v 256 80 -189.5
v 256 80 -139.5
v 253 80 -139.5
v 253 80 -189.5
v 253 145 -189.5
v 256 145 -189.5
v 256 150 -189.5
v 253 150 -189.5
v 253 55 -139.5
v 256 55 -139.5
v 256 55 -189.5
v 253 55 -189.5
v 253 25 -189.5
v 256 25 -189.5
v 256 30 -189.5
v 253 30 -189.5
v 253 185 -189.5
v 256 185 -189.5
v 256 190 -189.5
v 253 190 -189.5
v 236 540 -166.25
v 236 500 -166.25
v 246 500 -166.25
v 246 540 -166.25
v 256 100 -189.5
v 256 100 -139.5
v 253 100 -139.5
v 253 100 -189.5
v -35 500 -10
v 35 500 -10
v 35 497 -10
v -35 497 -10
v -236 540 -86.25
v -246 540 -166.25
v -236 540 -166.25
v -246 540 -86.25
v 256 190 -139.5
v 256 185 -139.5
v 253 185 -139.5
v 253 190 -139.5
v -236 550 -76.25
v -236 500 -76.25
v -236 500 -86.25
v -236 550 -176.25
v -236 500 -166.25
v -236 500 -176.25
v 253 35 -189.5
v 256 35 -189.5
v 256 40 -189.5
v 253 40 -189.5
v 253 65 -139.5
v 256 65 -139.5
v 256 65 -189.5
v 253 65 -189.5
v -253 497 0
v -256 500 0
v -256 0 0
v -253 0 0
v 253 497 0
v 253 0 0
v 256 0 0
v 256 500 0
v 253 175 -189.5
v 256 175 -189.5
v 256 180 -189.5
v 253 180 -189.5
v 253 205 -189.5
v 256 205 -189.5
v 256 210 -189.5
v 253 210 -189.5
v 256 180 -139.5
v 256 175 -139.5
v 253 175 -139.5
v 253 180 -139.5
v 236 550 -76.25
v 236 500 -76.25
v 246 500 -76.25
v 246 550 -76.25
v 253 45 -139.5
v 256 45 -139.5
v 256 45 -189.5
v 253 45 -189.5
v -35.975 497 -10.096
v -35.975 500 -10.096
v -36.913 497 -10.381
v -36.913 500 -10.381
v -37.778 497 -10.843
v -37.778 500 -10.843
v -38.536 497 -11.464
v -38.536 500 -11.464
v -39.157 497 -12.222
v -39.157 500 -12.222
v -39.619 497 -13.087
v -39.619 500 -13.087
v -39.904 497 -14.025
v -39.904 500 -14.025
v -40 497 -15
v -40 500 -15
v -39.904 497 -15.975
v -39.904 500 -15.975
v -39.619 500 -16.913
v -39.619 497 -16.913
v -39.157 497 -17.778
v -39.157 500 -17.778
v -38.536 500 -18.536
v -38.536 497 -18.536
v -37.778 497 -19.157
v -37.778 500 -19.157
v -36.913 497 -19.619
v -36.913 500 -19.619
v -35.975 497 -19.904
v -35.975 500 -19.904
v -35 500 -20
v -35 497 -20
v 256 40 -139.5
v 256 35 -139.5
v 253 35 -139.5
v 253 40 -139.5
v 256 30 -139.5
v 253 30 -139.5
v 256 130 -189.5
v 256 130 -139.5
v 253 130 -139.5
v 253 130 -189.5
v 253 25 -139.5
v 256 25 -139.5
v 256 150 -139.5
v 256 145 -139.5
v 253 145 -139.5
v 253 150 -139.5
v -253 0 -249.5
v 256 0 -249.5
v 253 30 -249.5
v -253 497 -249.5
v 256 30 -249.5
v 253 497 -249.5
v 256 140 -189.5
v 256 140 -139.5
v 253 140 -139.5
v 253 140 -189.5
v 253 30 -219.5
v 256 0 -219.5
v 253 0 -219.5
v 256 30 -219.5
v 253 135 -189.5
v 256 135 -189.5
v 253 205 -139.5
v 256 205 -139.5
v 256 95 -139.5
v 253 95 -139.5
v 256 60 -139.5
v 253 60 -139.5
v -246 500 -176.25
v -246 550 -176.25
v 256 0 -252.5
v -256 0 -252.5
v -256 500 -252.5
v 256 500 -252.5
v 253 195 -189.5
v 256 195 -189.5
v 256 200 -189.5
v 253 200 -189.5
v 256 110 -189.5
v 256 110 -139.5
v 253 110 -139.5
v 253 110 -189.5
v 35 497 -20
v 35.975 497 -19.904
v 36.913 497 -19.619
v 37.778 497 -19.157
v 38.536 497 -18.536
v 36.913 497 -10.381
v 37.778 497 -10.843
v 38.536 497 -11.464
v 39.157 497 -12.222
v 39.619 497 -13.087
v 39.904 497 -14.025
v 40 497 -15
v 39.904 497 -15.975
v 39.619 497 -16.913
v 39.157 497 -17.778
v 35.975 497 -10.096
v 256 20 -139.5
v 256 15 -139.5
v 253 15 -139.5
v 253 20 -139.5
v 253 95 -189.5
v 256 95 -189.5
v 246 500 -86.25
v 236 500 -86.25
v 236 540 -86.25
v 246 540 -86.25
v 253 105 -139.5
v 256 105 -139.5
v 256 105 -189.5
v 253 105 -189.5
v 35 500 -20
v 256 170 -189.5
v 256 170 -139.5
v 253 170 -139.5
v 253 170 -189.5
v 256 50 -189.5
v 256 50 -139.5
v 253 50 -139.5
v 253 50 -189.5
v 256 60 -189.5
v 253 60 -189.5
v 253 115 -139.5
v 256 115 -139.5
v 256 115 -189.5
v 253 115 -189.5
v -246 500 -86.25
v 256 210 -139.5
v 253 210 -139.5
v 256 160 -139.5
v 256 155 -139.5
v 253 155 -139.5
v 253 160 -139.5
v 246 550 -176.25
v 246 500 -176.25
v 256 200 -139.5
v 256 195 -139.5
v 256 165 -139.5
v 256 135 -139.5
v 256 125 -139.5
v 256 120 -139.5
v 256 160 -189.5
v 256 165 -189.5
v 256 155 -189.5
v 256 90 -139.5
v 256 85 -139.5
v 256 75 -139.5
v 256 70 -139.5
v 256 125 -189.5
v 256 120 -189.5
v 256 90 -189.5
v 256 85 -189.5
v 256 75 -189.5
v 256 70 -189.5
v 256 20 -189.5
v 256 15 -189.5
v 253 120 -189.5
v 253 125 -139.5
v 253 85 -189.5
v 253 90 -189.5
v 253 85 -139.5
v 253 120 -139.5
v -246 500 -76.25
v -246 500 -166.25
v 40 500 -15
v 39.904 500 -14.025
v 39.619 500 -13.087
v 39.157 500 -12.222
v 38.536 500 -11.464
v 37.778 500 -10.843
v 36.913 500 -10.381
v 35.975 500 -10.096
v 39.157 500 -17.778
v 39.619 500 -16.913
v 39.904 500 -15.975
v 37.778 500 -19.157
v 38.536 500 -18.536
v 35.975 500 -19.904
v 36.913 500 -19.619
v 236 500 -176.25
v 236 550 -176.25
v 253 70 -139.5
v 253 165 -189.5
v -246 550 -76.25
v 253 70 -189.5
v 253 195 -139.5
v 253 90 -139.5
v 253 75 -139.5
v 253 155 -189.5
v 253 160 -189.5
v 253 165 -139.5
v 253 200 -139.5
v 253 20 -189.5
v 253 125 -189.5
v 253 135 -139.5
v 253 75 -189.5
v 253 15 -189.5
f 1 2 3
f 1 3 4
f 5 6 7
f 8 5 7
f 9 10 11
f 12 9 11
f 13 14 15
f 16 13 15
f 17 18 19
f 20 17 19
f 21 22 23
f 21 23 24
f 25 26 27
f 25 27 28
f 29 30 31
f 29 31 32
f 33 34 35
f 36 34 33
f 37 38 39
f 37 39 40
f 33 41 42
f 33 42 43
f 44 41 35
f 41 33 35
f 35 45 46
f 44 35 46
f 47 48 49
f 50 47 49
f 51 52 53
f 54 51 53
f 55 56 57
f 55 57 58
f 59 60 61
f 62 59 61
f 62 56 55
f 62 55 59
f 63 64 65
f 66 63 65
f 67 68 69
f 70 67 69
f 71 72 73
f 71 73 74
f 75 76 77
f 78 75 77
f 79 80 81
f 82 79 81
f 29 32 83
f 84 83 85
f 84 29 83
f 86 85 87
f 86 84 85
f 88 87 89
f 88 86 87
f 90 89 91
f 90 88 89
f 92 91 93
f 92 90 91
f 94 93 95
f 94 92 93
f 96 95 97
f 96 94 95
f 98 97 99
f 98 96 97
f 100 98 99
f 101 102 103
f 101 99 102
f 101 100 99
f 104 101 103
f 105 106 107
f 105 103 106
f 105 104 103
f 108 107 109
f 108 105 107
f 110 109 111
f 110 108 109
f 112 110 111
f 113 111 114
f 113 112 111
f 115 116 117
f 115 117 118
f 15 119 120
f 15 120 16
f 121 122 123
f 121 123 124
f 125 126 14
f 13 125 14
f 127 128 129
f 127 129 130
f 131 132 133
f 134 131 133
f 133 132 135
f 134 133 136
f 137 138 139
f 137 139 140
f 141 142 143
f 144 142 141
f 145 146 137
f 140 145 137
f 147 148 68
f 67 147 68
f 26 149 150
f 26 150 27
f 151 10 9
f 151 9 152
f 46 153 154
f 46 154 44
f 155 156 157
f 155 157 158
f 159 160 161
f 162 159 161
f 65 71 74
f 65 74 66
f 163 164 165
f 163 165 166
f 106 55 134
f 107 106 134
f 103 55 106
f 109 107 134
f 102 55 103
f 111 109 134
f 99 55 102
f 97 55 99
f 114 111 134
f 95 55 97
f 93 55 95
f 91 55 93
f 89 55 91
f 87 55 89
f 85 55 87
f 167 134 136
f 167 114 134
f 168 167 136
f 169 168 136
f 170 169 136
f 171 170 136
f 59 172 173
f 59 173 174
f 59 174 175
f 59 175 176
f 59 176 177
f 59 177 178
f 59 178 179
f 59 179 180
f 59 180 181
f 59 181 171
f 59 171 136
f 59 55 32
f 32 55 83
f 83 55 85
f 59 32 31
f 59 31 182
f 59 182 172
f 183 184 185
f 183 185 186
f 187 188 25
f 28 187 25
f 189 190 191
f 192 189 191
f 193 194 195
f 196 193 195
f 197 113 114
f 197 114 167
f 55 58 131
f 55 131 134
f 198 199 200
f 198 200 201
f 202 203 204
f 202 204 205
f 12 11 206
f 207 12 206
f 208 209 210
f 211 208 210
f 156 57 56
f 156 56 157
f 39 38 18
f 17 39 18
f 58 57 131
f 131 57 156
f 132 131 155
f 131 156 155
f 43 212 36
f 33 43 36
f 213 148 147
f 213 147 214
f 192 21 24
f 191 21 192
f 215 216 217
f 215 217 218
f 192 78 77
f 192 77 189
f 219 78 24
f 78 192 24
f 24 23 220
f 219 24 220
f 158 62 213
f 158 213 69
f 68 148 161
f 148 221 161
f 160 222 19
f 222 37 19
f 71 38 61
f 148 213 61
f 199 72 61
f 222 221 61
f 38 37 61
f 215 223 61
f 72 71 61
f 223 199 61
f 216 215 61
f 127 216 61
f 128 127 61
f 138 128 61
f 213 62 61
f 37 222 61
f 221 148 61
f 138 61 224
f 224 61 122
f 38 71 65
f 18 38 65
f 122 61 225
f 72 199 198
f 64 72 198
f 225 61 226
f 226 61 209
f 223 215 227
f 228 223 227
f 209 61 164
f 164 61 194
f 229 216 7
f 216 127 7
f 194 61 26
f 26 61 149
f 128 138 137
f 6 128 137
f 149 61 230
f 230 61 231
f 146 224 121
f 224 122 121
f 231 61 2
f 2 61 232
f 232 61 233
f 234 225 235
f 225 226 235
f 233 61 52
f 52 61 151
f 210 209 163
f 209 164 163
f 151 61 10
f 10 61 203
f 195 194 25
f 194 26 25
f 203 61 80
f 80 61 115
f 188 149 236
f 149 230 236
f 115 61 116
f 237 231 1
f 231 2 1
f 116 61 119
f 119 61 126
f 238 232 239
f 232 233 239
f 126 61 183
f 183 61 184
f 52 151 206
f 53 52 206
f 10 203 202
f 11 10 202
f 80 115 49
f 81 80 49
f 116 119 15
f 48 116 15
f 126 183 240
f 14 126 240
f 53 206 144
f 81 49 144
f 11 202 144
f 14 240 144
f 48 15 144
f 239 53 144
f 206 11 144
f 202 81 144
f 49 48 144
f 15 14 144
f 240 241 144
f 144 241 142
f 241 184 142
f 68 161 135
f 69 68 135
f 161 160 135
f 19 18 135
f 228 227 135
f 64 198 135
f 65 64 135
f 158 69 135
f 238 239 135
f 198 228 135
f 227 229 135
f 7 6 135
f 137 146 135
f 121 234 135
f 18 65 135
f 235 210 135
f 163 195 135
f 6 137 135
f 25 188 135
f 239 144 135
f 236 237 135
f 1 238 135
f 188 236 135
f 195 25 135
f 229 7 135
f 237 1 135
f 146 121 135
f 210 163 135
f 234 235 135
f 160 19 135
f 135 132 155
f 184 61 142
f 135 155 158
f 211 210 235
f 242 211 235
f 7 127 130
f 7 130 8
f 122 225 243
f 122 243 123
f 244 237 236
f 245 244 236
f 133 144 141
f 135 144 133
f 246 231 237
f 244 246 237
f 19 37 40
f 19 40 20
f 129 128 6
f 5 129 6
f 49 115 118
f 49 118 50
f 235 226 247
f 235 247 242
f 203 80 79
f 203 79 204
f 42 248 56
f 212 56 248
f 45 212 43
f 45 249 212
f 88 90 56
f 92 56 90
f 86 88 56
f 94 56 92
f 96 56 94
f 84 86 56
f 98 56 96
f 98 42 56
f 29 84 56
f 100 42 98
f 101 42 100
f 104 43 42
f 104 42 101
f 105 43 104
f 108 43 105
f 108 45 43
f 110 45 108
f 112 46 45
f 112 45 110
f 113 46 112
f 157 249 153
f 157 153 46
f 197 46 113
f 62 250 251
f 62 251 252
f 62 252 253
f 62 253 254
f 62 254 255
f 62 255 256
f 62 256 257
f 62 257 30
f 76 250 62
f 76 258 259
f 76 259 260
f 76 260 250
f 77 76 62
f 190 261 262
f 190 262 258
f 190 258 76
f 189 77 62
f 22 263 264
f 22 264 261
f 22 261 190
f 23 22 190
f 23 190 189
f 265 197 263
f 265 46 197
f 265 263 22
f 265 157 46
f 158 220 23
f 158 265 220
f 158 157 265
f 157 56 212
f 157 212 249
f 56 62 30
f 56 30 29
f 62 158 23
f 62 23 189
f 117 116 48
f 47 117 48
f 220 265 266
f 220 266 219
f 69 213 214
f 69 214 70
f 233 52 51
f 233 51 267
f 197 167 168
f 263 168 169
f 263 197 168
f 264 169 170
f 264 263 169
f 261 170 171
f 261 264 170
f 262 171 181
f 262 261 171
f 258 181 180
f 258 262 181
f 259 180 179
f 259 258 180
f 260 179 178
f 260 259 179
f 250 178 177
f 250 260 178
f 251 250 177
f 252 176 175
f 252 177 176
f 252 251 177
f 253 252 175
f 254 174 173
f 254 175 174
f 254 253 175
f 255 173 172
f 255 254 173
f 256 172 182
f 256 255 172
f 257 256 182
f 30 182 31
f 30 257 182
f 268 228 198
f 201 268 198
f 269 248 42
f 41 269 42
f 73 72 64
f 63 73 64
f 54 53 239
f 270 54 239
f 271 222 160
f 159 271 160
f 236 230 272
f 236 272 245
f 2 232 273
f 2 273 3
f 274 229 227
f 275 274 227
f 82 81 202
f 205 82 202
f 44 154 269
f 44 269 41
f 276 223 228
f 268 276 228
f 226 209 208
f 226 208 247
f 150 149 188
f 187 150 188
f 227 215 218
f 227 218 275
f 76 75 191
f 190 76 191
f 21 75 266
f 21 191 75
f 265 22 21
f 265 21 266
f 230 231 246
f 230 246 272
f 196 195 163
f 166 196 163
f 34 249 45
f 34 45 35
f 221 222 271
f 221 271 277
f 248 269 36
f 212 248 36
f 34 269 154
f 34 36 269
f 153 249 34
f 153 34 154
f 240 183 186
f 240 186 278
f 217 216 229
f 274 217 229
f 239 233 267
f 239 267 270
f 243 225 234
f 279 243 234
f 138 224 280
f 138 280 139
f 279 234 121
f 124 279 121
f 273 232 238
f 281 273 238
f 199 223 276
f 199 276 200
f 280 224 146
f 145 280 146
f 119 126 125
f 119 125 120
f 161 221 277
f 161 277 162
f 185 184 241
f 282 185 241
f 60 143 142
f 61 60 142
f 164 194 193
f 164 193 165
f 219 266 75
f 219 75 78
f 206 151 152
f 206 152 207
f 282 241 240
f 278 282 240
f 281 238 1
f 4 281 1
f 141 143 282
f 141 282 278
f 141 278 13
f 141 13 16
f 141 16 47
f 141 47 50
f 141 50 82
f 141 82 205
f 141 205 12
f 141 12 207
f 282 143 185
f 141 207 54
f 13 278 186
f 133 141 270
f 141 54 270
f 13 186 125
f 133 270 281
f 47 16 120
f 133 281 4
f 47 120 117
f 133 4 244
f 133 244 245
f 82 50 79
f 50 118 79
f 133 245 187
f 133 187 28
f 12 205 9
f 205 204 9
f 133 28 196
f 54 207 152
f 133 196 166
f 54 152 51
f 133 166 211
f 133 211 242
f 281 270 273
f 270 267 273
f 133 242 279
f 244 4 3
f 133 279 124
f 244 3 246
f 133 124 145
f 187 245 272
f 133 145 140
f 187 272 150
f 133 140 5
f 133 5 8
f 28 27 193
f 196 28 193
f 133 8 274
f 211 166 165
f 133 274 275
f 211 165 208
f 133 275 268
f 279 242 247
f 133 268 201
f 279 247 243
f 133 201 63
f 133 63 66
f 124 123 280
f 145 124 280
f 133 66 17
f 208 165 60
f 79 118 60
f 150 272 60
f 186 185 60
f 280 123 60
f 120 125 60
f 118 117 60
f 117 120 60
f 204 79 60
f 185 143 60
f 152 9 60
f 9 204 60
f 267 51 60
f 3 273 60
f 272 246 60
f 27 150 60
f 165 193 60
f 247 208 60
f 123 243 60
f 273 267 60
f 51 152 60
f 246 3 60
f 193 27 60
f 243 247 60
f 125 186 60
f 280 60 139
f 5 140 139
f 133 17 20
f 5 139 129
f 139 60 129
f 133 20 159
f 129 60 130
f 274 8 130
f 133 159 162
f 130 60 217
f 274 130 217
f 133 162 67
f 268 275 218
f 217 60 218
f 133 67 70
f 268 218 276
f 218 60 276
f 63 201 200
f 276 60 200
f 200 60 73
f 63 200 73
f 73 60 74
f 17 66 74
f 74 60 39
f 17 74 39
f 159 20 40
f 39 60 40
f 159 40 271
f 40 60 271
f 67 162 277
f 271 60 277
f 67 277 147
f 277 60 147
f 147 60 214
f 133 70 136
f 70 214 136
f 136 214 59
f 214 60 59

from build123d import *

# Parameters (mm, degrees)
ESBO_O1_W                = 512
ESBO_O1_H                = 505
RESSALTO_EXTRUS_O1_DEPTH = 500
ESBO_O2_W                = 522
ESBO_O2_H                = 510
CORTE_EXTRUS_O1_DEPTH    = 252.5
ESBO_O6_W                = 506
ESBO_O6_H                = 497
CORTE_EXTRUS_O4_DEPTH    = 249.5
ESBO_O7_W                = 30
ESBO_O7_H                = 30
CABO_DE_ALIMENTA_O_DEPTH = 5
ESBO_O9_W                = 50
ESBO_O9_H                = 5
CORTE_EXTRUS_O6_DEPTH    = 5
PASSAGEM_FILAMENTO_DEPTH = 5
ESBO_O69_W               = 10
ESBO_O69_H               = 100
AL_A_2_DEPTH             = 50
ESBO_O70_W               = 80
ESBO_O70_H               = 40
AL_A_2_2_DEPTH           = 10
ESBO_O72_W               = 10
ESBO_O72_H               = 100
AL_A_1_DEPTH             = 50
ESBO_O74_W               = 80
ESBO_O74_H               = 40
AL_A_1_2_DEPTH           = 10


with BuildPart() as part:
    # Esboço1 → Ressalto-extrusão1 (new body)
    with BuildSketch(Plane(origin=(0, 0, 0), x_dir=(1, 0, 0), z_dir=(0, 1, 0))):
        Rectangle(ESBO_O1_W, ESBO_O1_H)
    extrude(amount=RESSALTO_EXTRUS_O1_DEPTH)

    # Esboço2 → Corte-extrusão1 (cut)
    with BuildSketch(Plane.XY.offset(252.5)):
        with Locations((0, 250)):
            Rectangle(ESBO_O2_W, ESBO_O2_H)
    extrude(amount=-CORTE_EXTRUS_O1_DEPTH, mode=Mode.SUBTRACT)

    # Esboço6 → Corte-extrusão4 (cut)
    with BuildSketch(Plane.XY):
        with Locations((0, 248.5)):
            Rectangle(ESBO_O6_W, ESBO_O6_H)
    extrude(amount=-CORTE_EXTRUS_O4_DEPTH, mode=Mode.SUBTRACT)

    # Esboço7 → Cabo de alimentação (cut)
    with BuildSketch(Plane(origin=(256, 0, 0), x_dir=(0, 0, -1), z_dir=(1, 0, 0))):
        with Locations((234.5, 15)):
            Rectangle(ESBO_O7_W, ESBO_O7_H)
    extrude(amount=-CABO_DE_ALIMENTA_O_DEPTH, mode=Mode.SUBTRACT)

    # Esboço9 → Corte-extrusão6 (cut)
    with BuildSketch(Plane(origin=(256, 0, 0), x_dir=(0, 0, -1), z_dir=(1, 0, 0))):
        with Locations((164.5, 17.5)):
            Rectangle(ESBO_O9_W, ESBO_O9_H)
        with Locations((164.5, 27.5)):
            Rectangle(ESBO_O9_W, ESBO_O9_H)
        with Locations((164.5, 47.5)):
            Rectangle(ESBO_O9_W, ESBO_O9_H)
        with Locations((164.5, 37.5)):
            Rectangle(ESBO_O9_W, ESBO_O9_H)
        with Locations((164.5, 67.5)):
            Rectangle(ESBO_O9_W, ESBO_O9_H)
        with Locations((164.5, 77.5)):
            Rectangle(ESBO_O9_W, ESBO_O9_H)
        with Locations((164.5, 87.5)):
            Rectangle(ESBO_O9_W, ESBO_O9_H)
        with Locations((164.5, 57.5)):
            Rectangle(ESBO_O9_W, ESBO_O9_H)
        with Locations((164.5, 107.5)):
            Rectangle(ESBO_O9_W, ESBO_O9_H)
        with Locations((164.5, 157.5)):
            Rectangle(ESBO_O9_W, ESBO_O9_H)
        with Locations((164.5, 117.5)):
            Rectangle(ESBO_O9_W, ESBO_O9_H)
        with Locations((164.5, 167.5)):
            Rectangle(ESBO_O9_W, ESBO_O9_H)
        with Locations((164.5, 127.5)):
            Rectangle(ESBO_O9_W, ESBO_O9_H)
        with Locations((164.5, 97.5)):
            Rectangle(ESBO_O9_W, ESBO_O9_H)
        with Locations((164.5, 147.5)):
            Rectangle(ESBO_O9_W, ESBO_O9_H)
        with Locations((164.5, 137.5)):
            Rectangle(ESBO_O9_W, ESBO_O9_H)
        with Locations((164.5, 177.5)):
            Rectangle(ESBO_O9_W, ESBO_O9_H)
        with Locations((164.5, 187.5)):
            Rectangle(ESBO_O9_W, ESBO_O9_H)
        with Locations((164.5, 207.5)):
            Rectangle(ESBO_O9_W, ESBO_O9_H)
        with Locations((164.5, 197.5)):
            Rectangle(ESBO_O9_W, ESBO_O9_H)
    extrude(amount=-CORTE_EXTRUS_O6_DEPTH, mode=Mode.SUBTRACT)

    # Esboço68 → Passagem Filamento (cut)
    with BuildSketch(Plane(origin=(0, 500, 0), x_dir=(1, 0, 0), z_dir=(0, 1, 0))):
        with BuildLine():
            Line((-35, 20), (35, 20))
            ThreePointArc((35, 20), (40, 15), (35, 10))
            Line((35, 10), (-35, 10))
            ThreePointArc((-35, 10), (-40, 15), (-35, 20))
        make_face()
    extrude(amount=-PASSAGEM_FILAMENTO_DEPTH, mode=Mode.SUBTRACT)

    # Esboço69 → Al_a - 2 (add)
    with BuildSketch(Plane(origin=(0, 500, 0), x_dir=(1, 0, 0), z_dir=(0, 1, 0))):
        with Locations((-241, 126.25)):
            Rectangle(ESBO_O69_W, ESBO_O69_H)
    extrude(amount=AL_A_2_DEPTH)

    # Esboço70 → Al_a _2 2 (cut)
    with BuildSketch(Plane.ZY.offset(246)):
        with Locations((-126.25, 520)):
            Rectangle(ESBO_O70_W, ESBO_O70_H)
    extrude(amount=-AL_A_2_2_DEPTH, mode=Mode.SUBTRACT)

    # Esboço72 → Al_a - 1 (add)
    with BuildSketch(Plane(origin=(531.113648875, 500, -10.670910915), x_dir=(1, 0, 0), z_dir=(0, 1, 0))):
        with Locations((-290.113648875, 115.579089085)):
            Rectangle(ESBO_O72_W, ESBO_O72_H)
    extrude(amount=AL_A_1_DEPTH)

    # Esboço74 → Al_a _1 2 (cut)
    with BuildSketch(Plane(origin=(236, 0, -10.670910915), x_dir=(0, 0, 1), z_dir=(-1, 0, 0))):
        with Locations((-115.579089085, 520)):
            Rectangle(ESBO_O74_W, ESBO_O74_H)
    extrude(amount=-AL_A_1_2_DEPTH, mode=Mode.SUBTRACT)


solid = part.part
